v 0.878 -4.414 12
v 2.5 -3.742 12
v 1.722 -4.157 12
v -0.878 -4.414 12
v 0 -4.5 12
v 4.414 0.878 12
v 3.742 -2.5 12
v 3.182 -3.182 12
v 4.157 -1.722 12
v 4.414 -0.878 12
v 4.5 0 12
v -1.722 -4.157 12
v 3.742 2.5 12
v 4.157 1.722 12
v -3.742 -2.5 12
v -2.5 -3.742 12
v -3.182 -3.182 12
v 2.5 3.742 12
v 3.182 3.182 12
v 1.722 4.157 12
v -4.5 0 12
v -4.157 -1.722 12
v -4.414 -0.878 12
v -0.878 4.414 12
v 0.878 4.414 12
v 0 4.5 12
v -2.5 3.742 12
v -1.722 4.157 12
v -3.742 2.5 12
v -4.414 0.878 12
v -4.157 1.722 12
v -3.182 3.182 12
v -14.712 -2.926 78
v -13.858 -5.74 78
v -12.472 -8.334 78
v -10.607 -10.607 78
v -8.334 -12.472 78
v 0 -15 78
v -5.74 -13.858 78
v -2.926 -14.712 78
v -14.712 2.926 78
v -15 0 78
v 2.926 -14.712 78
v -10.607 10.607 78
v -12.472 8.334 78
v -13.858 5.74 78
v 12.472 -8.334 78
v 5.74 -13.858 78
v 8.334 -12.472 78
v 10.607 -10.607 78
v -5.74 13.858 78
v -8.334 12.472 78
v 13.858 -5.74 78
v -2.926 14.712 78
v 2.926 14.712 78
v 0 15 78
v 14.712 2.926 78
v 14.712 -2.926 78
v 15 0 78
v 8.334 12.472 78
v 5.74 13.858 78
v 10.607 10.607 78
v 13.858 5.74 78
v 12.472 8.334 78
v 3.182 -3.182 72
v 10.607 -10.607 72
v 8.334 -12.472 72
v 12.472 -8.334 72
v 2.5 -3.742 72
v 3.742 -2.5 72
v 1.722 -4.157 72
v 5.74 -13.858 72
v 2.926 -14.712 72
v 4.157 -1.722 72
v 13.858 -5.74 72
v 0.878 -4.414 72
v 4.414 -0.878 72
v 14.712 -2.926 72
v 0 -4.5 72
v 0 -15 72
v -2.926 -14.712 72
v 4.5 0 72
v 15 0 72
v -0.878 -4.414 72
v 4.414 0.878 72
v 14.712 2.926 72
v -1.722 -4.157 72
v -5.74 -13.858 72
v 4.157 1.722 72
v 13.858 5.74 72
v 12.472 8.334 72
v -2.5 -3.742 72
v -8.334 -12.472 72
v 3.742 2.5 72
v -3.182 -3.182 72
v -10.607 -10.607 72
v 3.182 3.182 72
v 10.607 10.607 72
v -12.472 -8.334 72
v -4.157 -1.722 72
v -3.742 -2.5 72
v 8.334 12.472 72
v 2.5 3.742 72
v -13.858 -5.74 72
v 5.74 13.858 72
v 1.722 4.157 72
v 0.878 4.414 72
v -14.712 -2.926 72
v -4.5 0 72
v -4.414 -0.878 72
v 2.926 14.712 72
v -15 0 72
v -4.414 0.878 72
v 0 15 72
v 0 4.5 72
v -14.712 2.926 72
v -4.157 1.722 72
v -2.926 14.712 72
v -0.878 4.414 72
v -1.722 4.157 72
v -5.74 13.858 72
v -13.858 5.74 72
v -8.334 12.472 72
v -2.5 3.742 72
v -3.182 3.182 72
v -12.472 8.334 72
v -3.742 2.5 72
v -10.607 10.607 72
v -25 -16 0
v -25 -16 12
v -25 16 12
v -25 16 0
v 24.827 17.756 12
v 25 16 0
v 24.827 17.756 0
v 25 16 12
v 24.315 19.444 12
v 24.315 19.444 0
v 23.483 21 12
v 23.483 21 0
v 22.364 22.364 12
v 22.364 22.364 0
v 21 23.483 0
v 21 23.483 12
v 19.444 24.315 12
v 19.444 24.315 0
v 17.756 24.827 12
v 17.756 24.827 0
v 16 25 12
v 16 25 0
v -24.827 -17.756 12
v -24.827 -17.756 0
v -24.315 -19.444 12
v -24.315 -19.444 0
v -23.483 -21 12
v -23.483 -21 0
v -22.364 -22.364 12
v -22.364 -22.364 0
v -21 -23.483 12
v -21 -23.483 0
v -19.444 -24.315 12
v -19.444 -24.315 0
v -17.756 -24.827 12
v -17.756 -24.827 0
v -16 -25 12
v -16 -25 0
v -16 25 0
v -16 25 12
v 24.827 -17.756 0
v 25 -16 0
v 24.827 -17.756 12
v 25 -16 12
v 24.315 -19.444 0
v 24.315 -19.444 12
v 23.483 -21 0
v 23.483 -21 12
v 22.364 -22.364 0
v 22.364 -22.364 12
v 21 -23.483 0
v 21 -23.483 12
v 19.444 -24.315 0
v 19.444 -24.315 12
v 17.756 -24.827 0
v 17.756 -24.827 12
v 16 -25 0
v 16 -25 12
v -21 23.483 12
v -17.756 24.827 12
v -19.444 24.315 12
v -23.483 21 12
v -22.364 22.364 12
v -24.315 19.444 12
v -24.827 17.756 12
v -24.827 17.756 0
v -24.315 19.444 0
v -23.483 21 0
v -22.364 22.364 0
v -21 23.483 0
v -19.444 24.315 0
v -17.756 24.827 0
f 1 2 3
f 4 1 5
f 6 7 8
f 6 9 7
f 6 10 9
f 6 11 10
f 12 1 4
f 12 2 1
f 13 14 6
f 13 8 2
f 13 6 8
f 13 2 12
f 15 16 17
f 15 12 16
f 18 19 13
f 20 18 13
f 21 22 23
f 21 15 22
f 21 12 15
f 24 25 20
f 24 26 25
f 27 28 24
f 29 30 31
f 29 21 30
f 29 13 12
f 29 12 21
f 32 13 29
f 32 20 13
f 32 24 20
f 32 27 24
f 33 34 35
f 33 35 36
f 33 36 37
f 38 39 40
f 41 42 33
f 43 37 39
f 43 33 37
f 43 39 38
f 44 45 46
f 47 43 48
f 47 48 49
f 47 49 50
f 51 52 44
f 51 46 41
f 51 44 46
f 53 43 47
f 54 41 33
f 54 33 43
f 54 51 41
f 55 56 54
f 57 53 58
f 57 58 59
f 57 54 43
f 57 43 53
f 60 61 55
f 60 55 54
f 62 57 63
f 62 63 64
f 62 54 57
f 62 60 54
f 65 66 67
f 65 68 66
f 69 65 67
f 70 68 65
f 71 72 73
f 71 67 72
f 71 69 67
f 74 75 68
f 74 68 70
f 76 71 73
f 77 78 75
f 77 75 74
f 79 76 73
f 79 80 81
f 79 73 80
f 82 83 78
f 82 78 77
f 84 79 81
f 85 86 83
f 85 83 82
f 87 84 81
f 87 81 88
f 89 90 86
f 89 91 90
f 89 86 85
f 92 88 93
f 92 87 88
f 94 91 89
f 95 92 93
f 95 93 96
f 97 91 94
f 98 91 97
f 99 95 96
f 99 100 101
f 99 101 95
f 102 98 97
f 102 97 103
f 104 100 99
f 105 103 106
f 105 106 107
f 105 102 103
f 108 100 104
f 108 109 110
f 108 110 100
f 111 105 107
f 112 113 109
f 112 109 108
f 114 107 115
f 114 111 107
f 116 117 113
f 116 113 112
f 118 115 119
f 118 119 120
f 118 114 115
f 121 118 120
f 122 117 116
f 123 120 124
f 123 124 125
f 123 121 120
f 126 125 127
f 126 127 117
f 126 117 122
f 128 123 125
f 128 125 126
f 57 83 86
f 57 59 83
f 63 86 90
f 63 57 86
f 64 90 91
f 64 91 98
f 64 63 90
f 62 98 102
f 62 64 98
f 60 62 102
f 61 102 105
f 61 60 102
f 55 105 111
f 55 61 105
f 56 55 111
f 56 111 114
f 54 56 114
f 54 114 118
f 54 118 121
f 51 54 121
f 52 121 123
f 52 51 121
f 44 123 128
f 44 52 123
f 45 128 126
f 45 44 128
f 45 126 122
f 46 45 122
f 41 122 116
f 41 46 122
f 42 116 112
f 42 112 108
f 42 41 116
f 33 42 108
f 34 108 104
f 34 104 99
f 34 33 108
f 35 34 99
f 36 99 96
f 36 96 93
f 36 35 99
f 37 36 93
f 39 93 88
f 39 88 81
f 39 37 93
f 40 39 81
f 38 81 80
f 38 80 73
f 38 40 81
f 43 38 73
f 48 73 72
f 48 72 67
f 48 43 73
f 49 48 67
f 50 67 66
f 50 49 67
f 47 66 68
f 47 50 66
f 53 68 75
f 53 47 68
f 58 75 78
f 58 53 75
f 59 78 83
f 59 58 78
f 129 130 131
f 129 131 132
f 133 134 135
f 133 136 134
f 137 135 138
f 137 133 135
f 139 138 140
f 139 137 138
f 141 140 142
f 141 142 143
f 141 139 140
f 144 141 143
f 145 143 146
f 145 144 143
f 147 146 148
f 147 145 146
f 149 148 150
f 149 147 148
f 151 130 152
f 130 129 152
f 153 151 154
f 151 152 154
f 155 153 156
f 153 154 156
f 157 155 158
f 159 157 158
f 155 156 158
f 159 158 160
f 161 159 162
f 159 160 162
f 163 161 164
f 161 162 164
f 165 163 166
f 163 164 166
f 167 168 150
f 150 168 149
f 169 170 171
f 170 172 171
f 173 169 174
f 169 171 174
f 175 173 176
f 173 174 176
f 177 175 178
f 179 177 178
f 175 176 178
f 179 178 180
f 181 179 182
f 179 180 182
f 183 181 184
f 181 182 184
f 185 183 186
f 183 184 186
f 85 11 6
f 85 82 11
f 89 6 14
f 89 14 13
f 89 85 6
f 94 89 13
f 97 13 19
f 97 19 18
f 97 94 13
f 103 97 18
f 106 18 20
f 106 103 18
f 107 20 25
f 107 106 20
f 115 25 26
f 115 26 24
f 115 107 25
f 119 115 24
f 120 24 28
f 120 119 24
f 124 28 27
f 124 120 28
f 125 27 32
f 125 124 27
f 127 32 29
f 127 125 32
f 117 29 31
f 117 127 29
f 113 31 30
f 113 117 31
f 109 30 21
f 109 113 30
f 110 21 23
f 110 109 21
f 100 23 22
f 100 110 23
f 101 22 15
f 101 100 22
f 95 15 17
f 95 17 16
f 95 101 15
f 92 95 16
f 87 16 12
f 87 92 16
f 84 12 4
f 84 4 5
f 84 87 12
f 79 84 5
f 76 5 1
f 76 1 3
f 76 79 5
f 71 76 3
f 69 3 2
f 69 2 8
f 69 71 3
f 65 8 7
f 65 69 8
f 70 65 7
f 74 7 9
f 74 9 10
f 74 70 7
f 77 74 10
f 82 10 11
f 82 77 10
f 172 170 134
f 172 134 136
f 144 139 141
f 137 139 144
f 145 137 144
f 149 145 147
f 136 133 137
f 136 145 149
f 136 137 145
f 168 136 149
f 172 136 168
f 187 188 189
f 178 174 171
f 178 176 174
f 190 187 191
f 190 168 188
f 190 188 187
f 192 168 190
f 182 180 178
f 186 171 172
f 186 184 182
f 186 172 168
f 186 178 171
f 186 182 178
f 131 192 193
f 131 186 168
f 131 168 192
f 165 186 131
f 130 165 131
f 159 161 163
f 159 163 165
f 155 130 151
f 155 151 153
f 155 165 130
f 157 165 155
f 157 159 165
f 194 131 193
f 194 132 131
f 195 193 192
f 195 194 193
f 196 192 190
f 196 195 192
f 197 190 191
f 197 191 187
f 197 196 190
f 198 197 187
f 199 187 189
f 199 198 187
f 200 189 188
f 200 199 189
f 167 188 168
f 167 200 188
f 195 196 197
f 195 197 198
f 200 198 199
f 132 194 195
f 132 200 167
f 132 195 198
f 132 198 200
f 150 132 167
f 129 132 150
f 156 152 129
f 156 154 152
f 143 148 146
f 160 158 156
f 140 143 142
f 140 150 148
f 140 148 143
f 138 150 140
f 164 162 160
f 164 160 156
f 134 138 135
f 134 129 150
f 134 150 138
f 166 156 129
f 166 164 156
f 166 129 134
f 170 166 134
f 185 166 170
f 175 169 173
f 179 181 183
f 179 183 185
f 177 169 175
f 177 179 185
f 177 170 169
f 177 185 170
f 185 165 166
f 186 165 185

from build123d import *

# Parameters (mm, degrees)
F1_DEPTH = 25
F0_W     = 4.5
F0_H     = 60
F3_R     = 9


with BuildPart() as f1:
    # F0 (on Front) → F1 (new body, symmetric)
    with BuildSketch(Plane.XZ):
        Polygon((-25, 12), (-25, 0), (0, 0), (0, 12), (-4.5, 12), align=None)
        Polygon((0, 12), (0, 0), (25, 0), (25, 12), (4.5, 12), align=None)
    extrude(amount=F1_DEPTH, both=True)

    # F3
    f3_edges = [f1.edges().sort_by_distance(p)[0] for p in [
        (-25, -25, 6),
        (25, -25, 6),
        (25, 25, 6),
        (-25, 25, 6),
    ]]
    fillet(f3_edges, radius=F3_R)


with BuildPart() as f2:
    # F0 (on Front) → F2 (revolve)
    with BuildSketch(Plane.XZ):
        with Locations((2.25, 42)):
            Rectangle(F0_W, F0_H)
        Polygon((0, 78), (0, 72), (4.5, 72), (15, 72), (15, 78), align=None)
    revolve(axis=Axis((0, 0, 39), (0, 0, 1)))


solid = Compound([f1.part, f2.part])
